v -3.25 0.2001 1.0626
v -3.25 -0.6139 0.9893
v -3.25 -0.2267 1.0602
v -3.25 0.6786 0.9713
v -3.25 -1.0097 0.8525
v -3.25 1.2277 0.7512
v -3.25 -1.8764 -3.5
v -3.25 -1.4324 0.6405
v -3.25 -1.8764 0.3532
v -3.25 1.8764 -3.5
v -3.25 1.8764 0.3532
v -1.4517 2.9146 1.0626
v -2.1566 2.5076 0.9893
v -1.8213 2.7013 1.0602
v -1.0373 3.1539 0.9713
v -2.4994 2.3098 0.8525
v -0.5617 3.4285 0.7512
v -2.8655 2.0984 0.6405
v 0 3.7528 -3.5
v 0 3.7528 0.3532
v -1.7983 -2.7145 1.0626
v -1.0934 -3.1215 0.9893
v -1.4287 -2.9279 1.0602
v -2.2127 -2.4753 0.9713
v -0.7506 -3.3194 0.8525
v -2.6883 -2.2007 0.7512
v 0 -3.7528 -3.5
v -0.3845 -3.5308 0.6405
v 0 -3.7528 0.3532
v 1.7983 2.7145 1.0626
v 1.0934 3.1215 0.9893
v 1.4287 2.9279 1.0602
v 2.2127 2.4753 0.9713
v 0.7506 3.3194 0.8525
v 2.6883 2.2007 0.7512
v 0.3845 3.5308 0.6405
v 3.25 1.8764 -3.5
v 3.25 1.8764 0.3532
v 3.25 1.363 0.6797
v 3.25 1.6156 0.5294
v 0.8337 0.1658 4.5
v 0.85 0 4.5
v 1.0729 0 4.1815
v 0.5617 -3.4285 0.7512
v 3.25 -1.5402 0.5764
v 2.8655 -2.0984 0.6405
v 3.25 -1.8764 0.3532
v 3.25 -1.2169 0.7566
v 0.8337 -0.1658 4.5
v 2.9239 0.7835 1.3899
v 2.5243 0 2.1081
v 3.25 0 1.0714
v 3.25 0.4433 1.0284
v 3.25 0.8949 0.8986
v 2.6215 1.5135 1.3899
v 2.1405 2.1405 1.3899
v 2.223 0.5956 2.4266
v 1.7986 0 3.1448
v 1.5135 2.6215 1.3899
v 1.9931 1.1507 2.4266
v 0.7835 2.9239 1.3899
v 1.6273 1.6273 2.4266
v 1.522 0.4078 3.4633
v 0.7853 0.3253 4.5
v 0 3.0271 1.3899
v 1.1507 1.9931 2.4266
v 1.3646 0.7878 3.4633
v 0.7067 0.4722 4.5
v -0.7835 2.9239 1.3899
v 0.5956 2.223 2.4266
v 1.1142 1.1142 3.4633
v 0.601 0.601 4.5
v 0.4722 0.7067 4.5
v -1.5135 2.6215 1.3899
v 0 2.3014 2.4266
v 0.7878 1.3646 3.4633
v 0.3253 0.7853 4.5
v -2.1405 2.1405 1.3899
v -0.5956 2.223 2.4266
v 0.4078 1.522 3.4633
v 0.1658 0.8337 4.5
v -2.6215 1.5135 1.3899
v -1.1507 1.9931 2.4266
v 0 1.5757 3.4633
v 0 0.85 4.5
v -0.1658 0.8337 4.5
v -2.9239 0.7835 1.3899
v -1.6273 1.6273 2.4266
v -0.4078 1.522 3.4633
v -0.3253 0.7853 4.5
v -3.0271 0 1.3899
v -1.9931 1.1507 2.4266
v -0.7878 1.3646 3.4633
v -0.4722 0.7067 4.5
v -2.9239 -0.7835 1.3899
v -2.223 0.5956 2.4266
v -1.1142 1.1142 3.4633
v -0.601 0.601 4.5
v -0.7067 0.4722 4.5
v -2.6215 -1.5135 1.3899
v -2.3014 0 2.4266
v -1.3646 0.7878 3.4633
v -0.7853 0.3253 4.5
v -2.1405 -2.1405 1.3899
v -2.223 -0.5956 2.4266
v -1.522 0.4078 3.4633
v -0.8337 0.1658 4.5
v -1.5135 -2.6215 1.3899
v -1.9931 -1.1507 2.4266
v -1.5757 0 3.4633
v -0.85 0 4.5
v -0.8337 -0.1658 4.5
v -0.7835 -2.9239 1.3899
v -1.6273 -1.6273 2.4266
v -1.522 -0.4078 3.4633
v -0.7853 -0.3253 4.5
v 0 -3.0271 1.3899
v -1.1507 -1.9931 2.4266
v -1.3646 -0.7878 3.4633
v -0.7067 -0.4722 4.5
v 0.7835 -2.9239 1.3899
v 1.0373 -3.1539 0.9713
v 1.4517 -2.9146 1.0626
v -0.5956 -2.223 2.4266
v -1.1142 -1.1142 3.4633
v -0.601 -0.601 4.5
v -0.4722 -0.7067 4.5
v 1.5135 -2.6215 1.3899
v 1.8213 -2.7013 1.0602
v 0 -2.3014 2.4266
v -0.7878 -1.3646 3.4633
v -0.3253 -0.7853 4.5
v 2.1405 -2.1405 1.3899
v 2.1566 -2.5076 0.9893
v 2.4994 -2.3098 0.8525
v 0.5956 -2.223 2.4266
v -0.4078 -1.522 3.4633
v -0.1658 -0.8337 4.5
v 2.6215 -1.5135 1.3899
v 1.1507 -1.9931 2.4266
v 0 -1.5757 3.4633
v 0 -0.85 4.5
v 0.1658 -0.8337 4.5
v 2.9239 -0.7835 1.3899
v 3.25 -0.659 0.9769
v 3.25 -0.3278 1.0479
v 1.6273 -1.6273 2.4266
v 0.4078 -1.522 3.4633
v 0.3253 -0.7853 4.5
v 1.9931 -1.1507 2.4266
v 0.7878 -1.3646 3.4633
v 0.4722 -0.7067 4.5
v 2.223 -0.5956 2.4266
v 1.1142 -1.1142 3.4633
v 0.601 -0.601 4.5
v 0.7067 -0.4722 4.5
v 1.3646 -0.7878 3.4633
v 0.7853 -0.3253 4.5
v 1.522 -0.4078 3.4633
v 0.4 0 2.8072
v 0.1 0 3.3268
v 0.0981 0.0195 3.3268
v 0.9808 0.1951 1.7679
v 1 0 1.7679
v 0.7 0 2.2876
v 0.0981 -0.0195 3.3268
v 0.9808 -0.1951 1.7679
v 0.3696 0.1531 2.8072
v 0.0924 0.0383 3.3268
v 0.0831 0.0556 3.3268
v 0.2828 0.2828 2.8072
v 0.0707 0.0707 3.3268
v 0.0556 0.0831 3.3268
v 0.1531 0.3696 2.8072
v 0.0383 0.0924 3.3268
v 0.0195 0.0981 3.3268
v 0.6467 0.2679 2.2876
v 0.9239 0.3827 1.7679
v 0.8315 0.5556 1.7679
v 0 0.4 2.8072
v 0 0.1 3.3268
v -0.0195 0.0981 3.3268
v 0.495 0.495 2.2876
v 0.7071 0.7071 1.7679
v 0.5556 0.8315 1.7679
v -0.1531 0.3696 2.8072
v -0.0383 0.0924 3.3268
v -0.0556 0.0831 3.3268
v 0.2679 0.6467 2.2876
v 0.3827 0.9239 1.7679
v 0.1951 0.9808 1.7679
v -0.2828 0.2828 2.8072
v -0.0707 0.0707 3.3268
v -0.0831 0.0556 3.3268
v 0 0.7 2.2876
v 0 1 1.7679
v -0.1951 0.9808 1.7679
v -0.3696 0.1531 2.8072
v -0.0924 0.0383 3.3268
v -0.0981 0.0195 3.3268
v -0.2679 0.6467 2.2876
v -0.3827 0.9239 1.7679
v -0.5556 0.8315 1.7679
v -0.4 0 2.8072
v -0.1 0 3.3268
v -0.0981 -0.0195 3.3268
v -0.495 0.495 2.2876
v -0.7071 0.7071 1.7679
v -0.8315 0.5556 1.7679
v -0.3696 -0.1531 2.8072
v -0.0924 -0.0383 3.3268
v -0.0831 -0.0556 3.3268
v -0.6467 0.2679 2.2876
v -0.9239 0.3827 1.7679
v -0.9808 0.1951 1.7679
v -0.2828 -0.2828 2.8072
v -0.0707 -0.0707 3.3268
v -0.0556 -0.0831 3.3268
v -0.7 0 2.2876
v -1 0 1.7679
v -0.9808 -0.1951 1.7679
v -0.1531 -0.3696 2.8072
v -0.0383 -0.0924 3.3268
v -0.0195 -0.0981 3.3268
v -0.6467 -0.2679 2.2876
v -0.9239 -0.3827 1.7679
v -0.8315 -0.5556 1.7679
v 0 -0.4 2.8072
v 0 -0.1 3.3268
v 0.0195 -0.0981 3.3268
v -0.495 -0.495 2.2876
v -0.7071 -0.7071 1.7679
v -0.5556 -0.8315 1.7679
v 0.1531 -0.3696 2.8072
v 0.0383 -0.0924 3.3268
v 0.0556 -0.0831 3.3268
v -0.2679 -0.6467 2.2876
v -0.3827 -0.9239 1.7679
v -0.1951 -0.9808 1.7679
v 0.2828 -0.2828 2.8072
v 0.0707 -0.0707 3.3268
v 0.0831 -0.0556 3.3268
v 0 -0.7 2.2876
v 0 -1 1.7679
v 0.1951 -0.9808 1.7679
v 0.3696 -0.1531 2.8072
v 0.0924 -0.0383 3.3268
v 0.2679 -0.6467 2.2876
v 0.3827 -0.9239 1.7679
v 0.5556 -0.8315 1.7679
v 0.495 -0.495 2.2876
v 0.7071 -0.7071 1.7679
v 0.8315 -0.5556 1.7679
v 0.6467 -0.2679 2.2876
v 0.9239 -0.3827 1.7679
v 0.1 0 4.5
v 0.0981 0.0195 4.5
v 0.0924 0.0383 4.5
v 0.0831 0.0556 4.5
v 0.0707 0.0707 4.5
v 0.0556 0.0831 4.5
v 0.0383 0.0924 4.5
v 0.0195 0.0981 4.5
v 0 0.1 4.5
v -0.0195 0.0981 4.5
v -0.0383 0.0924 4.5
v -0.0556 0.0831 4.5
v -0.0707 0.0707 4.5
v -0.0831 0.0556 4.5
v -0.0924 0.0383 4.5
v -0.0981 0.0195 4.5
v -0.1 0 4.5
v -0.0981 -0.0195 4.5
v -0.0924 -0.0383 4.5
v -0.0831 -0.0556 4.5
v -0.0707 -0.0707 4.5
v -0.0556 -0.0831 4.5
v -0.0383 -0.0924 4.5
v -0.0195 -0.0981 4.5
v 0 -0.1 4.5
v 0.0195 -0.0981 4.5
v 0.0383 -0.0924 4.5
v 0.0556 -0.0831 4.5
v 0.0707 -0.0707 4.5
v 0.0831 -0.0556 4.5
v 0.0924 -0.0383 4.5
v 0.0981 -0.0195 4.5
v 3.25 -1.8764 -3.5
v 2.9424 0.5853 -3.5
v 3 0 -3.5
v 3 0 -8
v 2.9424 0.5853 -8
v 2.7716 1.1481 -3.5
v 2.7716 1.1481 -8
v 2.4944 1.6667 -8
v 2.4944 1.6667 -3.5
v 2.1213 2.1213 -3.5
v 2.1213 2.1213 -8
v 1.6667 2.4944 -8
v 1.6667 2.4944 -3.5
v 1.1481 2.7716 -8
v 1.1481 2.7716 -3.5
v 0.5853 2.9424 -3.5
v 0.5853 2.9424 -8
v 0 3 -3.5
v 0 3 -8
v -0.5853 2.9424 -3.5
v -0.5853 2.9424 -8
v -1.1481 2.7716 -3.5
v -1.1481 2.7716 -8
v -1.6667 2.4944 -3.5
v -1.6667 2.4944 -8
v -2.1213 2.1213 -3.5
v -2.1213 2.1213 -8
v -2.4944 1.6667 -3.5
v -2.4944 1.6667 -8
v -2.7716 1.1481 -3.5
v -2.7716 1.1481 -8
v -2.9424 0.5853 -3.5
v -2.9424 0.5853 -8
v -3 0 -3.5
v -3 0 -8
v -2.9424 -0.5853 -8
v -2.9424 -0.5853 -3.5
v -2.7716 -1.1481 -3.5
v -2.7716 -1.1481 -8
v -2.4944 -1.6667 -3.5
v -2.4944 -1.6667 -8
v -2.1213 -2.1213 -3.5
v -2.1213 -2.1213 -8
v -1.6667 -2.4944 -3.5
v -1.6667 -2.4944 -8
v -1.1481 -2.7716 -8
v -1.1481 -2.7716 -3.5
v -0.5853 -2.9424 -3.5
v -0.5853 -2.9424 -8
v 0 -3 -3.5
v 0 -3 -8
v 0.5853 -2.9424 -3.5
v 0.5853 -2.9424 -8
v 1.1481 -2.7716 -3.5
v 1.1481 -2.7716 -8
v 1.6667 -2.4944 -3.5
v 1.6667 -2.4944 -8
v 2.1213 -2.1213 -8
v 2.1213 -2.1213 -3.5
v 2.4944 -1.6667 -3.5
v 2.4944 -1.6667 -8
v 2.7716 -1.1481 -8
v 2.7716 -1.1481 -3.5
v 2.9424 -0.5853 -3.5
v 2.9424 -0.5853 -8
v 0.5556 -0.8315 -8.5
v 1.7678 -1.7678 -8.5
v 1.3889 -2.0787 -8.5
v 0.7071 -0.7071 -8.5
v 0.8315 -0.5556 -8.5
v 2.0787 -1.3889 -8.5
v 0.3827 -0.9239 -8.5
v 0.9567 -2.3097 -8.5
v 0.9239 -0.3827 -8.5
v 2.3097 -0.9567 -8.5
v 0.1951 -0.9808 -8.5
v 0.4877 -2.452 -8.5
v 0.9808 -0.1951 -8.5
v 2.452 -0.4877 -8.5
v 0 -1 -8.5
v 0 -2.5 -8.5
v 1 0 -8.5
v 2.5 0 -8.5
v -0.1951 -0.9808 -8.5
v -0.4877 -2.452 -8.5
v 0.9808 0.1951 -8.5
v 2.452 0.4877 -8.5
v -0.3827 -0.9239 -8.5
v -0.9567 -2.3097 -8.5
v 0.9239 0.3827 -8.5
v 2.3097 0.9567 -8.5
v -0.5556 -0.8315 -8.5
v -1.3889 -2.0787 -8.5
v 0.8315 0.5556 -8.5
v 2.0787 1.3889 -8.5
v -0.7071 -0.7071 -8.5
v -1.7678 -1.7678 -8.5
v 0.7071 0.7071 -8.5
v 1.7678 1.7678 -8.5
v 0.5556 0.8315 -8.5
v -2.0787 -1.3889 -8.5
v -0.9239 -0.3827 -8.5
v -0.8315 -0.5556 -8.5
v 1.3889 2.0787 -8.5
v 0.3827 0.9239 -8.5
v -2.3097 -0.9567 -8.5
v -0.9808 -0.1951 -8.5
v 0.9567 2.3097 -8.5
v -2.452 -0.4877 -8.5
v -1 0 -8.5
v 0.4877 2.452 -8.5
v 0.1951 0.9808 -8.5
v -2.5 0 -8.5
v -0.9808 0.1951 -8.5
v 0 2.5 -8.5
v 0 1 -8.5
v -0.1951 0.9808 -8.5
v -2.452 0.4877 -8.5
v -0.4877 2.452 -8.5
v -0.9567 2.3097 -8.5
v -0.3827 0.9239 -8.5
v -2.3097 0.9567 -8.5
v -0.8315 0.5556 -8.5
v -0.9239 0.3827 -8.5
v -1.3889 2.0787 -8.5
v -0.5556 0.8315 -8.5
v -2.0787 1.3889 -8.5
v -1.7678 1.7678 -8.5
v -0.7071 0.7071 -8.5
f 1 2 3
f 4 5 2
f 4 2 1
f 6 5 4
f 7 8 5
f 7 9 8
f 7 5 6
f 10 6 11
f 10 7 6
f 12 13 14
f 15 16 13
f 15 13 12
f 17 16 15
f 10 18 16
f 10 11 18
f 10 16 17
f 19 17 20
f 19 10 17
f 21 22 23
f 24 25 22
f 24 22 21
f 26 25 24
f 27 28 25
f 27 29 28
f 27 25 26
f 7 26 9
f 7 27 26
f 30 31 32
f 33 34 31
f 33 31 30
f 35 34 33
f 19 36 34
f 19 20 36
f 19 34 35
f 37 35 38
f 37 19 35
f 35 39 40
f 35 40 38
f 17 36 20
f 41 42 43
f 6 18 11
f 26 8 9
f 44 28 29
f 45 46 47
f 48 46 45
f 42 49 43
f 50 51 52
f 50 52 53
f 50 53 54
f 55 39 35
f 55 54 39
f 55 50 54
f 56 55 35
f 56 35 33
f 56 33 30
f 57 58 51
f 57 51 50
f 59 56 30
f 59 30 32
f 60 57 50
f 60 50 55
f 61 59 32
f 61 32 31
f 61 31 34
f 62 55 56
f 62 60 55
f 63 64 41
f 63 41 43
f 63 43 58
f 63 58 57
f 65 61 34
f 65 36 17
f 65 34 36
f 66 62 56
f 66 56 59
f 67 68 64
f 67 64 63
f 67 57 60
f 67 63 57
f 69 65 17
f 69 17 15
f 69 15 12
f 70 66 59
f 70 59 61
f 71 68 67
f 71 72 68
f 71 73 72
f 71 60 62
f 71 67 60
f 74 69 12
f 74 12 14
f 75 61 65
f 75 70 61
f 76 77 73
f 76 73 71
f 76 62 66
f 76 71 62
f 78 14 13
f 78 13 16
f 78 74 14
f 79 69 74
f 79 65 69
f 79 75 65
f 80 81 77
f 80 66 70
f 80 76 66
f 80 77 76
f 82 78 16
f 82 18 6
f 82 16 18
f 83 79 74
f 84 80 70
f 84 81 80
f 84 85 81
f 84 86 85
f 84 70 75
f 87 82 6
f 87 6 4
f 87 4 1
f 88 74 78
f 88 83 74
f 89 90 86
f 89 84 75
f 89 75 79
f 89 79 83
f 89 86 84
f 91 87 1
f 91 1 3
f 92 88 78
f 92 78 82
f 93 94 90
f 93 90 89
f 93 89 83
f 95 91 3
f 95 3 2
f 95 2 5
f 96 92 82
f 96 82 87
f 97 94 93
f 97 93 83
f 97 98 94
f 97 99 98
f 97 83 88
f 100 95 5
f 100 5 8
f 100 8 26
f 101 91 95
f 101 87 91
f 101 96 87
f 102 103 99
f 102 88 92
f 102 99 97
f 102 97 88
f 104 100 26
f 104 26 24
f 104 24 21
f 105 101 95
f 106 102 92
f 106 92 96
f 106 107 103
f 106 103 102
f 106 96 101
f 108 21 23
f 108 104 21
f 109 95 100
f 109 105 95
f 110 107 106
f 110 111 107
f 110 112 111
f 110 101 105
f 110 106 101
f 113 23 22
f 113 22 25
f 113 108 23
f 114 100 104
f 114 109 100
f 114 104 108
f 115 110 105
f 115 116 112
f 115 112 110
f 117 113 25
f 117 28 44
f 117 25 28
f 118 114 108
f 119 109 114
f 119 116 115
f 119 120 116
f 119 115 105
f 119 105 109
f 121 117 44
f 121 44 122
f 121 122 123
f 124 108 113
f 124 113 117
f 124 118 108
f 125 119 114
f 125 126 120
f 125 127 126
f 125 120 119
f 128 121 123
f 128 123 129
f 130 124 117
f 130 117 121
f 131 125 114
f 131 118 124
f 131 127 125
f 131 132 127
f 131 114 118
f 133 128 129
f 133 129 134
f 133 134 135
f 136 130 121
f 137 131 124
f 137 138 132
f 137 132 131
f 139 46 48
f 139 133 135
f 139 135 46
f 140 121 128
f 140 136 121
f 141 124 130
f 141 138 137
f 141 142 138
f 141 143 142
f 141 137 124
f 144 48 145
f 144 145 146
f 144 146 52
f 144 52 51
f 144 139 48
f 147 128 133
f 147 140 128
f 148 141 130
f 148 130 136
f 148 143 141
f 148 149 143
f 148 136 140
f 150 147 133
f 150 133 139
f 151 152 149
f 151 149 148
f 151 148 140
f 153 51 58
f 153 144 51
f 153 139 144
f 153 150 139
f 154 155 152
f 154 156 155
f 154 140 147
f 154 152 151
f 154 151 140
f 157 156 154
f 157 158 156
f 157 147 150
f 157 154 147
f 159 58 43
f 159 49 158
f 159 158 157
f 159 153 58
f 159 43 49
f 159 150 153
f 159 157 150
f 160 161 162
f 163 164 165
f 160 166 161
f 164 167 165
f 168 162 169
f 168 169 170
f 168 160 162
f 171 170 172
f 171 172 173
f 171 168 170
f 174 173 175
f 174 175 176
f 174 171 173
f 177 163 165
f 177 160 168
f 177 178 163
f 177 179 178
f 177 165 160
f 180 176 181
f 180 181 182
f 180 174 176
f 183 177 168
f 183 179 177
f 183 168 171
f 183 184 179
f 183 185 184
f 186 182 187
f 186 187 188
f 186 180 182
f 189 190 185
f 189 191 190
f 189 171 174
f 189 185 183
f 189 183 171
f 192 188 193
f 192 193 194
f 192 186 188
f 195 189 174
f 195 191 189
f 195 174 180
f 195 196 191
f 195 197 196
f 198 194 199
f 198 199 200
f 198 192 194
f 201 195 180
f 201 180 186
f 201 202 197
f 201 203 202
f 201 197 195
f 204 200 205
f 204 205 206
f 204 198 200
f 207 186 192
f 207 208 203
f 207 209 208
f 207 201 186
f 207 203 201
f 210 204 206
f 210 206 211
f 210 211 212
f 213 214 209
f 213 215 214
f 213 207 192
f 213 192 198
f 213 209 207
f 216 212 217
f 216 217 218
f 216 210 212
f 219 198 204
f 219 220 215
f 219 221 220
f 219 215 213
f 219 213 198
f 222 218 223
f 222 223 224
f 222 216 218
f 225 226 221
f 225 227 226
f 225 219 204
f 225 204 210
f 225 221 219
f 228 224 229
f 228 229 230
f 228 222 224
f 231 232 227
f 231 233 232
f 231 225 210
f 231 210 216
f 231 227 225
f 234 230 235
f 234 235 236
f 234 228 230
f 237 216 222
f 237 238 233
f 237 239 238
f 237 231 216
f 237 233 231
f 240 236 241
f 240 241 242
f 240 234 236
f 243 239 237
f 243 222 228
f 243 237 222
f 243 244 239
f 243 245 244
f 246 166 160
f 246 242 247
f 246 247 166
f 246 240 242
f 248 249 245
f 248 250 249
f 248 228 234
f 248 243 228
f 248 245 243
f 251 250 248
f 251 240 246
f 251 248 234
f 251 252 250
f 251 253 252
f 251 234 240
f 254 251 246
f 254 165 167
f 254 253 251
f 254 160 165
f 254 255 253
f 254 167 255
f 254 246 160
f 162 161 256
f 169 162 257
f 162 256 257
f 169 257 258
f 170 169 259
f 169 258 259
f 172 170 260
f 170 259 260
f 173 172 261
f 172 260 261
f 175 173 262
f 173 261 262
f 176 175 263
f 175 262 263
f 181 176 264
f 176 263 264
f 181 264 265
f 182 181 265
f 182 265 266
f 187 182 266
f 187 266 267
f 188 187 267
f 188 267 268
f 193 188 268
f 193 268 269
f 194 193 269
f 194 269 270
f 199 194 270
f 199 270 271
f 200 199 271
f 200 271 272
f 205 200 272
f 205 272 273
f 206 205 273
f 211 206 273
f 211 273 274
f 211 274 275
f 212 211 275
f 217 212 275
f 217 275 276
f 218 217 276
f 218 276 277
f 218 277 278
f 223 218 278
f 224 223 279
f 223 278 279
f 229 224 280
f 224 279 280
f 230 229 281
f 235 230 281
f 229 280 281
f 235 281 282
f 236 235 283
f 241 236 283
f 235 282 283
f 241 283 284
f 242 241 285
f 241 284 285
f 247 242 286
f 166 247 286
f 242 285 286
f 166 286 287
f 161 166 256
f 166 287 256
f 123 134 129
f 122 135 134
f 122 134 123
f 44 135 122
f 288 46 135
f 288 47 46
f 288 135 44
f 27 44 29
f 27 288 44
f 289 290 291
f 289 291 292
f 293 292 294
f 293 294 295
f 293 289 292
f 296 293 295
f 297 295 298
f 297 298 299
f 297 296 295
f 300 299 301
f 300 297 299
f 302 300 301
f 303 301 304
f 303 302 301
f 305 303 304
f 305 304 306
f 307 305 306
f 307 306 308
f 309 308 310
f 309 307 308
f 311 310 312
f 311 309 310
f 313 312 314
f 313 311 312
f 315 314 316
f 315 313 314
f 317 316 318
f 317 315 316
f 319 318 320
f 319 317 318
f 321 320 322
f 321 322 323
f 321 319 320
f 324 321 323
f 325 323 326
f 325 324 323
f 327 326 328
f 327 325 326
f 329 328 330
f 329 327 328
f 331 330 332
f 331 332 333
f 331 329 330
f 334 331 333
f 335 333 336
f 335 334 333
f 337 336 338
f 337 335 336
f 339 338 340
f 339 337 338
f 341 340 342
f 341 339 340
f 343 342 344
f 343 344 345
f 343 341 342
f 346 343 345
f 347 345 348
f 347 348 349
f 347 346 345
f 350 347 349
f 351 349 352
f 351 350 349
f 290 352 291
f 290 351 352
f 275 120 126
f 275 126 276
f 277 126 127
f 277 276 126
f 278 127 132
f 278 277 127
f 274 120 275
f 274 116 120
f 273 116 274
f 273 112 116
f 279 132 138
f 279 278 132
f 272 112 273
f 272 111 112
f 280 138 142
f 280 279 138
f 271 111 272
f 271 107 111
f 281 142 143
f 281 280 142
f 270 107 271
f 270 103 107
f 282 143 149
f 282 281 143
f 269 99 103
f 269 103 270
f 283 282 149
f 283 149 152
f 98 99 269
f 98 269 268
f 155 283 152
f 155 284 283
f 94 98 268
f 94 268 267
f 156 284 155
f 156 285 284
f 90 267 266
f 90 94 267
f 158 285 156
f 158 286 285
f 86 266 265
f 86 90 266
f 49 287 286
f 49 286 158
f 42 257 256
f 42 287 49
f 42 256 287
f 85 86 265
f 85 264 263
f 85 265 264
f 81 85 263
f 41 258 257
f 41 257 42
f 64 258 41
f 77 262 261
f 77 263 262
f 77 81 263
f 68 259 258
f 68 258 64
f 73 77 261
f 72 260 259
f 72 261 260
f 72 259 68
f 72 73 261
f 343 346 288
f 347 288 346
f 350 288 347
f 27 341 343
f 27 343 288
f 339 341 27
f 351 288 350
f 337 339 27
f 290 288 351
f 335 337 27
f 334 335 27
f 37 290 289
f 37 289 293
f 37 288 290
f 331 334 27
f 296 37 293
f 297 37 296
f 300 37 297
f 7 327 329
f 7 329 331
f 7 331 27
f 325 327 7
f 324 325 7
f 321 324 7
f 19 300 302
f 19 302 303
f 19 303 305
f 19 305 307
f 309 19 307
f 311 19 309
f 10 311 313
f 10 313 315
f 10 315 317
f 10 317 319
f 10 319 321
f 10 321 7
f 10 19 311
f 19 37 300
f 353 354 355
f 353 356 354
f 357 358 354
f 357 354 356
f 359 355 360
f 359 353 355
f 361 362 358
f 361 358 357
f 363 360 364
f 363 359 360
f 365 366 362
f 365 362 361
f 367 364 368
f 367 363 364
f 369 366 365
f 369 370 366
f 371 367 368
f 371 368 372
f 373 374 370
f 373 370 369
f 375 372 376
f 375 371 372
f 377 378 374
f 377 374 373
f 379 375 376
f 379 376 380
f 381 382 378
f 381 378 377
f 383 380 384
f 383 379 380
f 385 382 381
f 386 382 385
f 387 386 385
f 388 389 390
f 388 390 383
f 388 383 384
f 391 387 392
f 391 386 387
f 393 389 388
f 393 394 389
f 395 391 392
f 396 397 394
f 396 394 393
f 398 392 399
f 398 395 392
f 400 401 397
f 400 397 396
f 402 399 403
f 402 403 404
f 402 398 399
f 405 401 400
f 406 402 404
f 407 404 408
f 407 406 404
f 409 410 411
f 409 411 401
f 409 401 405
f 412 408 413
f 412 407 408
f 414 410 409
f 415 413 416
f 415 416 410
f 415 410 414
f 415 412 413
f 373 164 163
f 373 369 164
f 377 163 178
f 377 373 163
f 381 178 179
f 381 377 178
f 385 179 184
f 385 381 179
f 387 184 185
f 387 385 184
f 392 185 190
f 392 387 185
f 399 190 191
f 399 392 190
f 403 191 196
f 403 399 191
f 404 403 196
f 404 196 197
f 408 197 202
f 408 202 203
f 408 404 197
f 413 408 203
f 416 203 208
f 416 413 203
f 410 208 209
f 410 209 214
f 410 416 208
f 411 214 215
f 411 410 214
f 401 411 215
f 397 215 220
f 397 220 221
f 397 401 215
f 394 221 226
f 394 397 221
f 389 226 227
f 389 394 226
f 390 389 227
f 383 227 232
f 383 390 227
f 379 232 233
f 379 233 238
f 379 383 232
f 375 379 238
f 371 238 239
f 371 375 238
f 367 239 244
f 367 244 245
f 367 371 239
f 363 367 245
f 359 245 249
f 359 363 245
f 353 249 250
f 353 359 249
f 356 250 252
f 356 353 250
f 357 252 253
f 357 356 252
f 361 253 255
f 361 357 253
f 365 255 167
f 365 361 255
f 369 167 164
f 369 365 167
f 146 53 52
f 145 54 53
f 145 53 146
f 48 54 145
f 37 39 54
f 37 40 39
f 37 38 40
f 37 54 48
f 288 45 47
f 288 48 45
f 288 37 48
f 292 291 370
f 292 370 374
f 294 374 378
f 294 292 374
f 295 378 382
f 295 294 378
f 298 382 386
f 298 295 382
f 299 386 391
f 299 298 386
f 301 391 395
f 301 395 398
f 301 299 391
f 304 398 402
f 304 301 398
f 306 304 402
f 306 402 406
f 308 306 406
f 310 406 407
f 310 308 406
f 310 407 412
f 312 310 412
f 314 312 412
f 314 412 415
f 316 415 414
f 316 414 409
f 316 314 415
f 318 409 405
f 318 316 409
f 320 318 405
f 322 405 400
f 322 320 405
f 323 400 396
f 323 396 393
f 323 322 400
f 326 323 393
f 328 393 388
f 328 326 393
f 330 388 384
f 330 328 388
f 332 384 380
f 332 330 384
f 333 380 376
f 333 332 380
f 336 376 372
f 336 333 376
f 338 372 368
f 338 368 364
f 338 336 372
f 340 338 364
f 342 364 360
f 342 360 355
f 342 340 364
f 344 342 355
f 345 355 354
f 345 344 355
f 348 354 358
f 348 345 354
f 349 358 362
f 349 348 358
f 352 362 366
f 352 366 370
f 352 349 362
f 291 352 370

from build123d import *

# Parameters (mm, degrees)
SKETCH2_R          = 11.88832093
CUT_EXTRUDE2_DEPTH = 10
CHAMFER1_SIZE      = 0.5
SKETCH3_R          = 0.1
CUT_EXTRUDE3_DEPTH = 14


with BuildPart() as part:
    # Sketch1 → Revolve1 (revolve)
    with BuildSketch(Plane(origin=(0, 0, 0), x_dir=(1, 0, 0), z_dir=(0, 1, 0))):
        Polygon((1, 8.5), (3, 8.5), (3, 3.5), (4, 3.5), (4, 0), (0.85, -4.5), (0, -4.5), (0, -3.5), (1, -1.767949192), align=None)
    revolve(axis=Axis((0, 0, 0), (0, 0, 1)))

    # Sketch2 → Cut-Extrude2 (cut)
    with BuildSketch(Plane(origin=(0, 0, -3.5), x_dir=(-1, 0, 0), z_dir=(0, 0, -1))):
        Circle(SKETCH2_R)
        Polygon((3.25, 1.876388375), (0, 3.75277675), (-3.25, 1.876388375), (-3.25, -1.876388375), (0, -3.75277675), (3.25, -1.876388375), align=None, mode=Mode.SUBTRACT)
    extrude(amount=-CUT_EXTRUDE2_DEPTH, mode=Mode.SUBTRACT)

    # Chamfer1
    chamfer1_edges = [part.edges().sort_by_distance(p)[0] for p in [
        (-3, 0, -8.5),
    ]]
    chamfer(chamfer1_edges, length=CHAMFER1_SIZE)

    # Sketch3 → Cut-Extrude3 (cut, through all)
    with BuildSketch(Plane.XY.offset(4.5)):
        Circle(SKETCH3_R)
    extrude(amount=-CUT_EXTRUDE3_DEPTH, mode=Mode.SUBTRACT)


solid = part.part
